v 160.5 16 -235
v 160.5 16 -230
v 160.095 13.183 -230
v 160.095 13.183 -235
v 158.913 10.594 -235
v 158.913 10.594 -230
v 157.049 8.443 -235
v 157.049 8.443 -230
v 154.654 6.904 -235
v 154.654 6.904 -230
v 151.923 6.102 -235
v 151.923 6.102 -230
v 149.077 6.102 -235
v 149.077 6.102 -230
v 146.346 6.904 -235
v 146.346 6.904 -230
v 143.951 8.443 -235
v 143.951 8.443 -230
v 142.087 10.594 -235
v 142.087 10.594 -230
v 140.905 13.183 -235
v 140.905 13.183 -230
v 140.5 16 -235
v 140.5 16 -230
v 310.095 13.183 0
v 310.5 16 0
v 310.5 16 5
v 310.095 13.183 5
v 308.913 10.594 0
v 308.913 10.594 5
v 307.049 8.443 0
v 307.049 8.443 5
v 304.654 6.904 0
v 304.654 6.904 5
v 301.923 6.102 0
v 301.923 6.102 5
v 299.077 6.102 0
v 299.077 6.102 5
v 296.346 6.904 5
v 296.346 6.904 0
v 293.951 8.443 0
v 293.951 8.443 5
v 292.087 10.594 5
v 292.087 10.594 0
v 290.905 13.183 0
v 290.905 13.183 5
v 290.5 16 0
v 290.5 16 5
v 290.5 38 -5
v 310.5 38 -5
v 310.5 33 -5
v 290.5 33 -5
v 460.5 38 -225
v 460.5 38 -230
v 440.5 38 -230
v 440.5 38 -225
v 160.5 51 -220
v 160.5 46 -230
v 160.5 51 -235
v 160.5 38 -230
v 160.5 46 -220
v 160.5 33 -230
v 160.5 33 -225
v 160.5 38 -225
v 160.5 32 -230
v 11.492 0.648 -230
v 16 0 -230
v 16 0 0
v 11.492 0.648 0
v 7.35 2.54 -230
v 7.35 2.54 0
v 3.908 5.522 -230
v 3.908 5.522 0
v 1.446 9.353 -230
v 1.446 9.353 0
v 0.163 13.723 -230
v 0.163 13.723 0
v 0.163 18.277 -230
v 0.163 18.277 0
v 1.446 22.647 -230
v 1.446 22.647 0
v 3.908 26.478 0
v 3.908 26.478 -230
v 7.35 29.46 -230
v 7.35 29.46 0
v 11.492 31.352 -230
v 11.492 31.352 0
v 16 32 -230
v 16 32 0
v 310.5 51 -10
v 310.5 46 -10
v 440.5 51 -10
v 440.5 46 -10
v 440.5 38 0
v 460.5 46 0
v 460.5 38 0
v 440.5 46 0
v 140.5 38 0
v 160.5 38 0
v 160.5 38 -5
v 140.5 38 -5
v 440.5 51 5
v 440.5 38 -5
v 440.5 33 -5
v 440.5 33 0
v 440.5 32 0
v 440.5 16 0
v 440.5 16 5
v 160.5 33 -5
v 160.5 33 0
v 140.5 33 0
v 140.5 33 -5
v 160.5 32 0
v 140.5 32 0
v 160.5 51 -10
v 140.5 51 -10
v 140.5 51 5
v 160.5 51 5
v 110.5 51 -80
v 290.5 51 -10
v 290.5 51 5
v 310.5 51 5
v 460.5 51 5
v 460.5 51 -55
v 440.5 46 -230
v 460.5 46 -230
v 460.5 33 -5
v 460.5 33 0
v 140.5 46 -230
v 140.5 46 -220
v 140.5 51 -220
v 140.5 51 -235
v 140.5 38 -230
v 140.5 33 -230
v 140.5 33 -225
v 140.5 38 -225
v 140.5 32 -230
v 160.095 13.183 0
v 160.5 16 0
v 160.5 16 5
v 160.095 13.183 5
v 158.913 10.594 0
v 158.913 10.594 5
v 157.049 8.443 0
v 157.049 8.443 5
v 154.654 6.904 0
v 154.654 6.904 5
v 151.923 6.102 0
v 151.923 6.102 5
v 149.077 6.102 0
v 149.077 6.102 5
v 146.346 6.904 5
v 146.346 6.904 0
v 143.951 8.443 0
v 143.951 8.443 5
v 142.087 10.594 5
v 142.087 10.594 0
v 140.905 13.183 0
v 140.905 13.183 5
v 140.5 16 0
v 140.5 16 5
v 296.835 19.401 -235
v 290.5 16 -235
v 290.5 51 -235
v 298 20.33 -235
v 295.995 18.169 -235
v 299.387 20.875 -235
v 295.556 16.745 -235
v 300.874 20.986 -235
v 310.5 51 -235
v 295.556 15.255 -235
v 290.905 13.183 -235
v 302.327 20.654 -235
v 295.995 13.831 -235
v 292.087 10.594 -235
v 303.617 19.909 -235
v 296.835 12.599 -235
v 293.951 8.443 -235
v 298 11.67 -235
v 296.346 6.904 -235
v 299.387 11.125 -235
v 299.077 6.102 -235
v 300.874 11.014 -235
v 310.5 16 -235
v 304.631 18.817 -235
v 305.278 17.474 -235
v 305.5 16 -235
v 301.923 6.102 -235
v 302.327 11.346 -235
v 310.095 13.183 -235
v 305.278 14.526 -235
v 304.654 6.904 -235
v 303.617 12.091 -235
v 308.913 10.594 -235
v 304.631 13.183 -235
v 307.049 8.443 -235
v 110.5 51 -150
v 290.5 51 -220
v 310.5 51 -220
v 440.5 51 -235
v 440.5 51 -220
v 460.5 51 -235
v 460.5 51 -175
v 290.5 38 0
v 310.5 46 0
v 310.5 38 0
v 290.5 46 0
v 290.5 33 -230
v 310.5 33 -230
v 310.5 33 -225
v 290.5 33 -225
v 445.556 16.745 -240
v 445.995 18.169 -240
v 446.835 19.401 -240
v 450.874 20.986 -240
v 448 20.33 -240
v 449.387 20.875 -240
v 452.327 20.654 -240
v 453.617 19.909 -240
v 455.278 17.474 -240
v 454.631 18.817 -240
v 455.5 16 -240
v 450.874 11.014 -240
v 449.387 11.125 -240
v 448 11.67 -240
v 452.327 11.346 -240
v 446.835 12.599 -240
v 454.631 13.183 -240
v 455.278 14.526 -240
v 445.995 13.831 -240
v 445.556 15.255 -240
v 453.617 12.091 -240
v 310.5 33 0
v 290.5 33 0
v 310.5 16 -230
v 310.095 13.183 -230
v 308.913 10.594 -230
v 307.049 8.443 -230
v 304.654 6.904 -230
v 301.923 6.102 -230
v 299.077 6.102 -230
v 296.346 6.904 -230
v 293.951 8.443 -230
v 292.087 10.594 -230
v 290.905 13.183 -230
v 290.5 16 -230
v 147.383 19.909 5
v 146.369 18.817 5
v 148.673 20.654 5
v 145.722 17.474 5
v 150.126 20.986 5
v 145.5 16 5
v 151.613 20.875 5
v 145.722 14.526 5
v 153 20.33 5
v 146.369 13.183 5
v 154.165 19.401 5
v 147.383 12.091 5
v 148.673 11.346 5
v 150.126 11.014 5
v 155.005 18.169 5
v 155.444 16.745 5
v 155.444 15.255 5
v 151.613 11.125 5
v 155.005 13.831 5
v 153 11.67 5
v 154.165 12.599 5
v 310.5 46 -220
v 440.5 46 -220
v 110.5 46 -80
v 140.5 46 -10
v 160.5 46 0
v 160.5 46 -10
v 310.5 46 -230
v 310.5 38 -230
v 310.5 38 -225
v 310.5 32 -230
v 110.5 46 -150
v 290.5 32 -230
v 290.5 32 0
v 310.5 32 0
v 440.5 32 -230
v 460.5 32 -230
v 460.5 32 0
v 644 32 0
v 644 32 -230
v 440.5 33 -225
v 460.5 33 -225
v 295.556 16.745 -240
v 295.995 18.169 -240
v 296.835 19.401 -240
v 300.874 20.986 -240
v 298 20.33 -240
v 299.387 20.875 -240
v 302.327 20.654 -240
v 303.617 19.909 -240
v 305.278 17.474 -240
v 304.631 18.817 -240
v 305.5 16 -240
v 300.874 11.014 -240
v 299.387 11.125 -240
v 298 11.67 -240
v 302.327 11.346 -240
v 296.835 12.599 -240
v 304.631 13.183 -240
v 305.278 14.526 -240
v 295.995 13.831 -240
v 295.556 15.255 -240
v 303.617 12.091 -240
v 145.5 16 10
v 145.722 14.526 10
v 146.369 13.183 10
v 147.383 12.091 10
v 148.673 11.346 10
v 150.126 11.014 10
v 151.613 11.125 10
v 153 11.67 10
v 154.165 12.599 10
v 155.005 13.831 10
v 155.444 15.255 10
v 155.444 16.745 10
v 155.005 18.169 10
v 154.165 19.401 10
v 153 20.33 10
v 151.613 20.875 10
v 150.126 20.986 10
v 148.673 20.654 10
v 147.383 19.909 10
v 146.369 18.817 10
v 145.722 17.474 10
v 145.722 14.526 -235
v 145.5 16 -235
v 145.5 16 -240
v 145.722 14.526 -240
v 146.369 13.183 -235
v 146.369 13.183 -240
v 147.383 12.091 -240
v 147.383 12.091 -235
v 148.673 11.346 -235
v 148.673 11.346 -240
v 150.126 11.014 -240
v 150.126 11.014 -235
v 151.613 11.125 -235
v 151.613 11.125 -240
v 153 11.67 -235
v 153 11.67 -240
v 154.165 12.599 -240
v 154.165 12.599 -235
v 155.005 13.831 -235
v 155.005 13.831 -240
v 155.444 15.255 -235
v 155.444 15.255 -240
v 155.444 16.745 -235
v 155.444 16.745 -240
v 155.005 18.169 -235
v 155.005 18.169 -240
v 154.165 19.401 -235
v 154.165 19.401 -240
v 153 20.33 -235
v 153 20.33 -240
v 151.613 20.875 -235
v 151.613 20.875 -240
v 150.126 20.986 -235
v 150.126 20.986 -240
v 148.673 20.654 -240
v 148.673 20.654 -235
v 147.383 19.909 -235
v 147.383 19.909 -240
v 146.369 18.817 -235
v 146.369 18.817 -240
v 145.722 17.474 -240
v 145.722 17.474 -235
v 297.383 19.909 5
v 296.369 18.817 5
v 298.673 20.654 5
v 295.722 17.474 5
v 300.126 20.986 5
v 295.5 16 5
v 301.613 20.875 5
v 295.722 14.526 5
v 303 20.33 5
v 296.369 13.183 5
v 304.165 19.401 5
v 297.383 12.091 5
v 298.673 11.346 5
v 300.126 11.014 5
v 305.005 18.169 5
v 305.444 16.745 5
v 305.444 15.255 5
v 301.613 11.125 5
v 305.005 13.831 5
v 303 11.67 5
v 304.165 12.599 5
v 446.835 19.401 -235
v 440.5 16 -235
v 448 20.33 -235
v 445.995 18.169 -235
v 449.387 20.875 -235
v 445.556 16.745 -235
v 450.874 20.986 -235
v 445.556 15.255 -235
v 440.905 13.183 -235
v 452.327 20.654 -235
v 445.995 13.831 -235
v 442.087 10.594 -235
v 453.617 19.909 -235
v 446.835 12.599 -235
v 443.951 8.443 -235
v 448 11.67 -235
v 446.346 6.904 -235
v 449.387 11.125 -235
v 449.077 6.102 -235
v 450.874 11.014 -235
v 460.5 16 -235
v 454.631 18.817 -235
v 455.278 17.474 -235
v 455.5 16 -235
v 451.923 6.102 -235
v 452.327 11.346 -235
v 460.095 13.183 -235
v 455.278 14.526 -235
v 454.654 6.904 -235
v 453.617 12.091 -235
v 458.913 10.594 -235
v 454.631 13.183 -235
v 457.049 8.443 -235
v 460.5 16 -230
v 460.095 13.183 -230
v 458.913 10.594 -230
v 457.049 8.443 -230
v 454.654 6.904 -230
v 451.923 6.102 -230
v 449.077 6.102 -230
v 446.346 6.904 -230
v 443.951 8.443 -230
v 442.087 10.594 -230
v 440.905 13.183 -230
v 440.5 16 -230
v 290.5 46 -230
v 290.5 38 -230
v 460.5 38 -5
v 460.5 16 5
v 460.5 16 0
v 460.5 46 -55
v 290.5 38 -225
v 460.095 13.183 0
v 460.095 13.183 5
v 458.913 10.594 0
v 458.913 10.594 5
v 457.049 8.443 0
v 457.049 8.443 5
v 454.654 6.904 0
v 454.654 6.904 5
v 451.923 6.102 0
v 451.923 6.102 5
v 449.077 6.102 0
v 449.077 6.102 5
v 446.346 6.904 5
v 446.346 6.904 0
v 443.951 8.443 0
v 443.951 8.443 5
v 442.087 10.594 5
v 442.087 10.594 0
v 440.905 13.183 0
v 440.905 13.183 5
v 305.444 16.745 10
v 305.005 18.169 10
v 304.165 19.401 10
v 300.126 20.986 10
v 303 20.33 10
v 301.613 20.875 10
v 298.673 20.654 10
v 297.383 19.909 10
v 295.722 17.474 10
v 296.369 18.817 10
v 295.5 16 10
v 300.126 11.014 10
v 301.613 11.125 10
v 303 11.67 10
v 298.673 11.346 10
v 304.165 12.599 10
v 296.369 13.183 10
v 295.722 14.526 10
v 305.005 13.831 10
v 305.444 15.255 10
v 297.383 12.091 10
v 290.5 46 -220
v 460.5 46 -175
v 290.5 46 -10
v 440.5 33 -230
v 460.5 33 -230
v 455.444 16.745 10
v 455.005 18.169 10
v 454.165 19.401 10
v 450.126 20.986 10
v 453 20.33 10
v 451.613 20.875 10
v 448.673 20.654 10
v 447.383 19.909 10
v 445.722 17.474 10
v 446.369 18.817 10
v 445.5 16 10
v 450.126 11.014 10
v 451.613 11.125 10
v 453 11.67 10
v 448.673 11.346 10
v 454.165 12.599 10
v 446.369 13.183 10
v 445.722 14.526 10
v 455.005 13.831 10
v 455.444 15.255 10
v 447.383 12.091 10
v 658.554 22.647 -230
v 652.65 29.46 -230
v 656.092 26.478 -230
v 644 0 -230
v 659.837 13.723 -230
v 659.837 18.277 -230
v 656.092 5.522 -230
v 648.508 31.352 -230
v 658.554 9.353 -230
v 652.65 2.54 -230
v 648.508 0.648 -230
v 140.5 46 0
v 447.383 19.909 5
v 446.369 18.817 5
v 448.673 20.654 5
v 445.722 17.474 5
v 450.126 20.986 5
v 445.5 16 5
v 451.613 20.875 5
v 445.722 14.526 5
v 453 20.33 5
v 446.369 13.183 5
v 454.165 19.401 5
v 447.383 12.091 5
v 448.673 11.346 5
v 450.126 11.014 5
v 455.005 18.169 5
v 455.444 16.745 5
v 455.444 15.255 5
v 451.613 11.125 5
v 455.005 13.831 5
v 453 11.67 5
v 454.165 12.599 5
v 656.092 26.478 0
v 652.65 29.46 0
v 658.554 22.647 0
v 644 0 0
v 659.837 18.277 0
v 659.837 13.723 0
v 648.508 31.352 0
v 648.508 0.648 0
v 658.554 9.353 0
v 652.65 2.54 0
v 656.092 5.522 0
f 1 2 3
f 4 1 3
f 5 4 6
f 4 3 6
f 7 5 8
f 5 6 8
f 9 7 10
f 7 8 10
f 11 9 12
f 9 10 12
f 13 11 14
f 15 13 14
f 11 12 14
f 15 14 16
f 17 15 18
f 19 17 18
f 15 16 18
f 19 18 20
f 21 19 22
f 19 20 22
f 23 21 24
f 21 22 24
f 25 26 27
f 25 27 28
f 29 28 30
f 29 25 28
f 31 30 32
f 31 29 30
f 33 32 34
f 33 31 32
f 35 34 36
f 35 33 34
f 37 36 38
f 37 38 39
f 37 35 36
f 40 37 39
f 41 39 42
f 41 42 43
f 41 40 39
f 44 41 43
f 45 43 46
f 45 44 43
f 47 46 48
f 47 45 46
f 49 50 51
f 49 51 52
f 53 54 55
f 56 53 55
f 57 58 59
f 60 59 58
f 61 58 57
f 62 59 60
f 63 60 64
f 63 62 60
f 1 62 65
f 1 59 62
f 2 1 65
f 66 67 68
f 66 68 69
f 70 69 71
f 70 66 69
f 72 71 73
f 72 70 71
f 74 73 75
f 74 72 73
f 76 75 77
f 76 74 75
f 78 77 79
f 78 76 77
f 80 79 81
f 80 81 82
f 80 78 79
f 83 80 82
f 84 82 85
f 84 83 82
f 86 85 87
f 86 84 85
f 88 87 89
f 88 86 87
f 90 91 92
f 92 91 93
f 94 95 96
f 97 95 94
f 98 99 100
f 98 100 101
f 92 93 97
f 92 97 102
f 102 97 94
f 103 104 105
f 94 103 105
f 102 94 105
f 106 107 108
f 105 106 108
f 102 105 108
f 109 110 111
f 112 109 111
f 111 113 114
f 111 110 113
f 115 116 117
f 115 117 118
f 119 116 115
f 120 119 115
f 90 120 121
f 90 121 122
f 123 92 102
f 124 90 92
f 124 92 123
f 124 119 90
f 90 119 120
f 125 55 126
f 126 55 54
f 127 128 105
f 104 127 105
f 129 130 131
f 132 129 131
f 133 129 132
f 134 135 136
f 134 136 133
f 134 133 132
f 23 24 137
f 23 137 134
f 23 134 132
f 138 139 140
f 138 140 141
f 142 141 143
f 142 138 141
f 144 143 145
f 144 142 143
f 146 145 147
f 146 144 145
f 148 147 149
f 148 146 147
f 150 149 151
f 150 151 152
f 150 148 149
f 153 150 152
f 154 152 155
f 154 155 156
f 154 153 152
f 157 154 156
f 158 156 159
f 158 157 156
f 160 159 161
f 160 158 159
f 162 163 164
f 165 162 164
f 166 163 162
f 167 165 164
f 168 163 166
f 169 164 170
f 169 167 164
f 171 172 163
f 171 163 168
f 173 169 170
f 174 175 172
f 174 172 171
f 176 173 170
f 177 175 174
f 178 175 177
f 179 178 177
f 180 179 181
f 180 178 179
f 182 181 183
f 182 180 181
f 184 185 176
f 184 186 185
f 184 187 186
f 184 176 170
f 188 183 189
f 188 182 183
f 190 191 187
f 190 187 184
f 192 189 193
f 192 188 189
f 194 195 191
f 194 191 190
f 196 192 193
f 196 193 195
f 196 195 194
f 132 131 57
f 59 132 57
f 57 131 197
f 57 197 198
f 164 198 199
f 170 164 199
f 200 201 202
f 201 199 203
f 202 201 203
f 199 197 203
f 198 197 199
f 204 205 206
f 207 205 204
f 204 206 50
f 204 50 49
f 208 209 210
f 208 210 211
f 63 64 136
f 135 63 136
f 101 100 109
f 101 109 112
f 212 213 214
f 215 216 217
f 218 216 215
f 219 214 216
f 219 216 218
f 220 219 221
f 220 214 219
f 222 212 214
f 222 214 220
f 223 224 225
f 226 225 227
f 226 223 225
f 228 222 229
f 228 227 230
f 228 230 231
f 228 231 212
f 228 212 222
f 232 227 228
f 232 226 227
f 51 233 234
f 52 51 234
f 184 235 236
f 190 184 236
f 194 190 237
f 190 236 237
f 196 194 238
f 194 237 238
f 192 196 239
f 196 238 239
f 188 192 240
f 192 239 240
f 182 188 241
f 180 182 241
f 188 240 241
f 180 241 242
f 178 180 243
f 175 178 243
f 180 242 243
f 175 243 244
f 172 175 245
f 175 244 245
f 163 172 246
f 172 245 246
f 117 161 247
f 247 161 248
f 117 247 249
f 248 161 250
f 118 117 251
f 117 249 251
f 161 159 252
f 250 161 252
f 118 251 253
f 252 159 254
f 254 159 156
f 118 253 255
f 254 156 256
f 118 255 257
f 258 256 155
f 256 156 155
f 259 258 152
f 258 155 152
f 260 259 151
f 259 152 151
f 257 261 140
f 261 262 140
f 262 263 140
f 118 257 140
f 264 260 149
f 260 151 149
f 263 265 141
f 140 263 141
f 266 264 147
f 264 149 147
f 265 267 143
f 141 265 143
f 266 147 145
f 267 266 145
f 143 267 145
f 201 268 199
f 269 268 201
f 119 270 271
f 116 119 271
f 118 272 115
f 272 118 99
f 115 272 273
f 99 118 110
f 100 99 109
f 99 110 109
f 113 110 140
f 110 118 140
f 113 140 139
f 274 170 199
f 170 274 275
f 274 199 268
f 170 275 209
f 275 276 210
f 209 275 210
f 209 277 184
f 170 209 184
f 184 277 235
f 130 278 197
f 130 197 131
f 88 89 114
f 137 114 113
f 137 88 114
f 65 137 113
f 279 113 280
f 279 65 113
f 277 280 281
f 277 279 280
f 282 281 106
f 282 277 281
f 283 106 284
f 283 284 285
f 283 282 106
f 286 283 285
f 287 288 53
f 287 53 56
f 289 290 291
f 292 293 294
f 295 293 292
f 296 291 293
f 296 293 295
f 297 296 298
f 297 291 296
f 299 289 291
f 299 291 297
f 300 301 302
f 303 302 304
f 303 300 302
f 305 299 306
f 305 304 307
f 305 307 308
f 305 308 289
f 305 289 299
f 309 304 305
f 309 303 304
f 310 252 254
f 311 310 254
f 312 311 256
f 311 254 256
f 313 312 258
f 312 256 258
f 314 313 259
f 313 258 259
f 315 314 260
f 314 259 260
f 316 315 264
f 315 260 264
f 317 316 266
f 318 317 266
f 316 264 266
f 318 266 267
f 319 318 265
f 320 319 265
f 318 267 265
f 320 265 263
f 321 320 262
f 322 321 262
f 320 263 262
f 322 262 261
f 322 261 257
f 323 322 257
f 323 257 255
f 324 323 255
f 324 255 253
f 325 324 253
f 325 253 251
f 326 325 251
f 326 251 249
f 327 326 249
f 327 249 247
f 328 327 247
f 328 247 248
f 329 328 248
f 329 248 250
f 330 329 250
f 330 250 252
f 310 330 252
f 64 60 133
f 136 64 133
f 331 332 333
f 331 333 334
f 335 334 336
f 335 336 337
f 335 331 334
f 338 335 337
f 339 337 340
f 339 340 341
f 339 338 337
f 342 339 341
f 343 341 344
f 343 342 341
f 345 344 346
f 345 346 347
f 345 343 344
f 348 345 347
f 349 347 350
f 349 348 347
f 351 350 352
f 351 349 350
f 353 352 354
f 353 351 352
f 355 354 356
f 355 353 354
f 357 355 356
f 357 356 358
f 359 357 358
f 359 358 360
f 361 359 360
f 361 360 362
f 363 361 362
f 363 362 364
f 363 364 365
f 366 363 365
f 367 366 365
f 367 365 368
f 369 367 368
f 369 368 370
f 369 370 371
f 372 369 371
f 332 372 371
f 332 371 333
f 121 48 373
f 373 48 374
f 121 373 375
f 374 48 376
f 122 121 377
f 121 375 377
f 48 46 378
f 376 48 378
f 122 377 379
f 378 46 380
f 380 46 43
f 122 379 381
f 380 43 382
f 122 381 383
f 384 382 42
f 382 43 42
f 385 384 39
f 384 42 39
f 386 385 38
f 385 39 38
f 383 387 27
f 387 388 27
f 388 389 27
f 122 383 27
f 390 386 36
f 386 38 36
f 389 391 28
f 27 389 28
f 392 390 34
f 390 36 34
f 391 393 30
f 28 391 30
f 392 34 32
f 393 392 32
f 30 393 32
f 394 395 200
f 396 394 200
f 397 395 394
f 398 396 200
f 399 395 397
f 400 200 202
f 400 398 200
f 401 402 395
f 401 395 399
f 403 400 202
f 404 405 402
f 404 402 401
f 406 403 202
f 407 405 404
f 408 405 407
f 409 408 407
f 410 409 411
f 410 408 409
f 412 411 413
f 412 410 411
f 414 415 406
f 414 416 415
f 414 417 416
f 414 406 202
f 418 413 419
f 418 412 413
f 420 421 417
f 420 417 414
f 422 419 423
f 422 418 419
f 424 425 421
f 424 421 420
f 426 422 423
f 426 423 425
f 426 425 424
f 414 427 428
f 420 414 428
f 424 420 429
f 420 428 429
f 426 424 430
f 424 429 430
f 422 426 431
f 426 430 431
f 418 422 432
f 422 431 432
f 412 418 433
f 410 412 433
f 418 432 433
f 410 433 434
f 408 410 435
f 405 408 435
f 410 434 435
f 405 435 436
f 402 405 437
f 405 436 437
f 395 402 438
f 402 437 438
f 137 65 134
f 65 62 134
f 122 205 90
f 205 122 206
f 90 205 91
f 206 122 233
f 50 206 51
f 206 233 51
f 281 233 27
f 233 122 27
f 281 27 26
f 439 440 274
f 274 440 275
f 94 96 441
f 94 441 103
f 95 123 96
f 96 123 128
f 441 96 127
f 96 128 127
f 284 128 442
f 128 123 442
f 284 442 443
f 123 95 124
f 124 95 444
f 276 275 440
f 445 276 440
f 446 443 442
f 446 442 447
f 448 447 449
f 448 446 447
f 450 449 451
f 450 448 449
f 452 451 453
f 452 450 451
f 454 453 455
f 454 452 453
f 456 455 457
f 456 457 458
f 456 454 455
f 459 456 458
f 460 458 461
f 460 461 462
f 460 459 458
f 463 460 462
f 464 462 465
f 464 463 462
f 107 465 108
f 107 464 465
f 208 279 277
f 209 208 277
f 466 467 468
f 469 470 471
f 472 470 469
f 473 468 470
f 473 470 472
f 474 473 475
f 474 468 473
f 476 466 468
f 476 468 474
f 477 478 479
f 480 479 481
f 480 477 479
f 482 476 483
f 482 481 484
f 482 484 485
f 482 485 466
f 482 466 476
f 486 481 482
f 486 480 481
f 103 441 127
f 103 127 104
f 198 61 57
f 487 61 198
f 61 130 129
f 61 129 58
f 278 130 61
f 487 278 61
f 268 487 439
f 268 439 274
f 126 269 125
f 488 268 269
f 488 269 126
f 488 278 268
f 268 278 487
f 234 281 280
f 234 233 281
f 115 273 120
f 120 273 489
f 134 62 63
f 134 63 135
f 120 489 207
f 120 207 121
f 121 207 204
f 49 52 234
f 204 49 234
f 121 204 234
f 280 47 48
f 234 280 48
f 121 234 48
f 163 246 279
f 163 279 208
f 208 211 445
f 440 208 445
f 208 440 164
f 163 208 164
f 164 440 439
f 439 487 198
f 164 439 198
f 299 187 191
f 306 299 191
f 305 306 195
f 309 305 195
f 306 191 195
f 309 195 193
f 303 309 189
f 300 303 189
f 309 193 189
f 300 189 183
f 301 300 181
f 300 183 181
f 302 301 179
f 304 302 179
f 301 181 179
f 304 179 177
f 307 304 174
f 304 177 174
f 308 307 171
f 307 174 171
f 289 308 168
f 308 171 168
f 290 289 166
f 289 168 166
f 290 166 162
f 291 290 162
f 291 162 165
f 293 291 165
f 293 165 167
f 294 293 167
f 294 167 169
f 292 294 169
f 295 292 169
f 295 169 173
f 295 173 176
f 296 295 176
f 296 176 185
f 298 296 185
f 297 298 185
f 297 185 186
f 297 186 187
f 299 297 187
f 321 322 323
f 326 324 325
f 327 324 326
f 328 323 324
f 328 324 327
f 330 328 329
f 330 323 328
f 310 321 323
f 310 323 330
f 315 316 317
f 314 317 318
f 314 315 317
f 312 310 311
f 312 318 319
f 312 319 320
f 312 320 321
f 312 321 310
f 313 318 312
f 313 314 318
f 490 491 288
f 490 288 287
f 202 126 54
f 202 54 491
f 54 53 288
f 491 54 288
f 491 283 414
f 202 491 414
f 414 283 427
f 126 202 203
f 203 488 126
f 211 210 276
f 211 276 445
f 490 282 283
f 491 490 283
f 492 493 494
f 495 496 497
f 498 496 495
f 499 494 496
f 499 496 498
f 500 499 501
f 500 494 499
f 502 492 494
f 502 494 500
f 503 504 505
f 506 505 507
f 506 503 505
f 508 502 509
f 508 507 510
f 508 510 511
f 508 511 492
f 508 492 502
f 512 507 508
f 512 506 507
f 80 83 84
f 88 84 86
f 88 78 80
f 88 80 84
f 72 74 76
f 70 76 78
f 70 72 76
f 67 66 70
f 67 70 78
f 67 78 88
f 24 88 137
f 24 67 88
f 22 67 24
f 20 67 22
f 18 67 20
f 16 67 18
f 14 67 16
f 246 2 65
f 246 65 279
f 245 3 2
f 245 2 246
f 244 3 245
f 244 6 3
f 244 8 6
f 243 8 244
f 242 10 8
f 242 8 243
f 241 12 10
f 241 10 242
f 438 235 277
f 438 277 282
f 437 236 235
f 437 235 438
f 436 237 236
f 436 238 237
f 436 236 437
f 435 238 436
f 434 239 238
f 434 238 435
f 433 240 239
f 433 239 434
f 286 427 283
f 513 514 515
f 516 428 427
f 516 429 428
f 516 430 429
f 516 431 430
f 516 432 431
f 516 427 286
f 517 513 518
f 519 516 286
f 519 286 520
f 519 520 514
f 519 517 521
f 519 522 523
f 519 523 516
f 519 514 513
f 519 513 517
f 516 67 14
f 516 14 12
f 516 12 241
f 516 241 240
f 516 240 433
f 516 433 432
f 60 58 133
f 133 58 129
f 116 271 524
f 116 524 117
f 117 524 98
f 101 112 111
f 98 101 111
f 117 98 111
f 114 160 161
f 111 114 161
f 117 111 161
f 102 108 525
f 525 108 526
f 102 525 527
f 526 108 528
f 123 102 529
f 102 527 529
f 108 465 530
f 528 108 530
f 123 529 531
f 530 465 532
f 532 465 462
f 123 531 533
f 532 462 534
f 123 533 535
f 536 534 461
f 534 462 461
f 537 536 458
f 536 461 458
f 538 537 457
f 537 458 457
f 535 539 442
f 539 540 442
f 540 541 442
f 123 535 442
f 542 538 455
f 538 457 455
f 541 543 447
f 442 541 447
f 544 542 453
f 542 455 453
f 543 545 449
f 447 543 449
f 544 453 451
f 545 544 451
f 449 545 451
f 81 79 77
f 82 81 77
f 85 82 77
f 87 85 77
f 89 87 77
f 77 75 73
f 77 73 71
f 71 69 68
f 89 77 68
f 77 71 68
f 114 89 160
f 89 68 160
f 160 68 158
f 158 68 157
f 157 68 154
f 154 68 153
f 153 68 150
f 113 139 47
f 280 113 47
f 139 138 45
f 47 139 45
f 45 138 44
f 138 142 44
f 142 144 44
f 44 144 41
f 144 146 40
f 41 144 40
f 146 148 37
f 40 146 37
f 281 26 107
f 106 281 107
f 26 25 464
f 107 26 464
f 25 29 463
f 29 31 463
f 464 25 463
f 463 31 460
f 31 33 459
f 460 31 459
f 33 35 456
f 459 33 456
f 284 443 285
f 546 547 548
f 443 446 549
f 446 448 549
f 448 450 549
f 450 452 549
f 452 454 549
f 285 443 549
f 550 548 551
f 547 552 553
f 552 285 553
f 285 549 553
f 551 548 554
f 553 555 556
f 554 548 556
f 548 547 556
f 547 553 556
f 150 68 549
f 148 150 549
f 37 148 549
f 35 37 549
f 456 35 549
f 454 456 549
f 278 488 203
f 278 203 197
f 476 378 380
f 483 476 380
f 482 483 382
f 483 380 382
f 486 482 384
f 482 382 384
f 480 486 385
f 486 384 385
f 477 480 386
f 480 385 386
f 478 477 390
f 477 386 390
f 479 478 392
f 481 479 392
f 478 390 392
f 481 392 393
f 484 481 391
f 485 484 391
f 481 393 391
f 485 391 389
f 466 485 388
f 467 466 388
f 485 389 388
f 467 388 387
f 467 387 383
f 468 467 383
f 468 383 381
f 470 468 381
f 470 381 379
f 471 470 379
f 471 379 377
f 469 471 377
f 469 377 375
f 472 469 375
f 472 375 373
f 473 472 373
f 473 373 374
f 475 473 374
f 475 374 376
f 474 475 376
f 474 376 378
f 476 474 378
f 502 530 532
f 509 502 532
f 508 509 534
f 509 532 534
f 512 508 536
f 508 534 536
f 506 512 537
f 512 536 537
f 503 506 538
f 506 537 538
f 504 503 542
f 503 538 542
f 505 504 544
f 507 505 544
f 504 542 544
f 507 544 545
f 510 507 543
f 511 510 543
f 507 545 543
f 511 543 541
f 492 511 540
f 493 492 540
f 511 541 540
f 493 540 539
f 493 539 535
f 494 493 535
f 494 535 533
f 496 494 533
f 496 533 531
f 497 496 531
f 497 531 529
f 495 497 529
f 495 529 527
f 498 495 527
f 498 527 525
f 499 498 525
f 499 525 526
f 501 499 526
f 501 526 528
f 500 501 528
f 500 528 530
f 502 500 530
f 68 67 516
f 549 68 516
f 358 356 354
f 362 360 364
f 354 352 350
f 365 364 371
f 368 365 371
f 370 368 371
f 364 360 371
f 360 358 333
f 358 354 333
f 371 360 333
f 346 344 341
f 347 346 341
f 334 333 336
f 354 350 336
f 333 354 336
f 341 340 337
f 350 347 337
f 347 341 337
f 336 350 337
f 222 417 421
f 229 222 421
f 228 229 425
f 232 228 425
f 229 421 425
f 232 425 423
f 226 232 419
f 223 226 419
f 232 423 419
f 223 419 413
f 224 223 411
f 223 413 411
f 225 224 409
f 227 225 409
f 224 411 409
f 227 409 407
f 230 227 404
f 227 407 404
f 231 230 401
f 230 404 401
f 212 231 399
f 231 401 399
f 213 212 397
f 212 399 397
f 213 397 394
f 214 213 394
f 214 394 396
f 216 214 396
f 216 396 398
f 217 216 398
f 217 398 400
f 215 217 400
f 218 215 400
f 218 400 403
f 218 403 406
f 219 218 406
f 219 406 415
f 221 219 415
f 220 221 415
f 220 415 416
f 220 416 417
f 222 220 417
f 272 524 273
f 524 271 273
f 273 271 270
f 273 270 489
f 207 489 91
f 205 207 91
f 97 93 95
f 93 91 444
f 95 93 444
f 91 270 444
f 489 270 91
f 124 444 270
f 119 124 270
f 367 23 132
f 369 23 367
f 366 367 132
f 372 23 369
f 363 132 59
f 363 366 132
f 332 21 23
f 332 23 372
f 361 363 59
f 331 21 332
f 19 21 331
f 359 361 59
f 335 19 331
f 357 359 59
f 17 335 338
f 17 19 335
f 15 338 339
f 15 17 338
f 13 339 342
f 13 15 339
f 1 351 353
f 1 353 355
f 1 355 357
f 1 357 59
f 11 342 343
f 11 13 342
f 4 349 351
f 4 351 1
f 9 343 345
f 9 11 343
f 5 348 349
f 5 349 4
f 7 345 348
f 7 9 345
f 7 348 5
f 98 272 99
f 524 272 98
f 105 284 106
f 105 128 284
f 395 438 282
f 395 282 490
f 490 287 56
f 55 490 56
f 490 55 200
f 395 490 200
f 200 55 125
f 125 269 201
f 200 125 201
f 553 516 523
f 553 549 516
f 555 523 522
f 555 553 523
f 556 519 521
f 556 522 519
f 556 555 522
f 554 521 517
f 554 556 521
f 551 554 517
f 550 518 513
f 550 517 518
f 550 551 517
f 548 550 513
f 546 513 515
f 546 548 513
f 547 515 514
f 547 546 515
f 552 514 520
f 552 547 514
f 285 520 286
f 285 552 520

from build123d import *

# Parameters (mm, degrees)
ESBO_O1_W                      = 660
ESBO_O1_H                      = 230
RESSALTO_EXTRUS_O1_DEPTH       = 32
FILETE1_RADIUS                 = 16
FILETE1_LENGTH                 = 230
FILETE2_RADIUS                 = 16
FILETE2_LENGTH                 = 230
ESBO_O2_R                      = 5
RESSALTO_EXTRUS_O2_DEPTH       = 10
PADR_O_LINEAR1_COUNT           = 3
PADR_O_LINEAR1_PITCH           = 150
PADR_O_LINEAR1_COPY_1_SKETCH_R = 5
PADR_O_LINEAR1_COPY_1_DEPTH    = 10
PADR_O_LINEAR1_COPY_2_SKETCH_R = 5
PADR_O_LINEAR1_COPY_2_DEPTH    = 10
ESBO_O6_R                      = 5
RESSALTO_EXTRUS_O7_DEPTH       = 5
ESBO_O10_W                     = 20
ESBO_O10_H                     = 5
RESSALTO_EXTRUS_O11_DEPTH      = 5
PADR_O_LINEAR2_COUNT           = 3
PADR_O_LINEAR2_PITCH           = 150
RESSALTO_EXTRUS_O10_DEPTH      = 5
ESPELHAR2_COPY_1_SKETCH_R      = 5
ESPELHAR2_COPY_1_DEPTH         = 5
ESPELHAR2_COPY_2_SKETCH_R      = 5
ESPELHAR2_COPY_2_DEPTH         = 5
ESPELHAR2_COPY_3_SKETCH_W      = 20
ESPELHAR2_COPY_3_SKETCH_H      = 5
ESPELHAR2_COPY_3_DEPTH         = 5
ESPELHAR2_COPY_4_SKETCH_W      = 20
ESPELHAR2_COPY_4_SKETCH_H      = 5
ESPELHAR2_COPY_4_DEPTH         = 5


with BuildPart() as part:
    # Esboço1 → Ressalto-extrusão1 (new body)
    with BuildSketch(Plane(origin=(0, 0, 0), x_dir=(1, 0, 0), z_dir=(0, 1, 0))):
        with Locations((330, 115)):
            Rectangle(ESBO_O1_W, ESBO_O1_H)
    extrude(amount=RESSALTO_EXTRUS_O1_DEPTH)

    # Filete1: full round fillet: the end face becomes a half cylinder, R = half its width
    filete1_face = Plane((0, 16, -115), x_dir=(0, 0, -1), z_dir=(-1, 0, 0))  # on the end face: x along it, z out of the body
    filete1_slab = filete1_face.offset(-FILETE1_RADIUS / 2) * Box(FILETE1_LENGTH, 2 * FILETE1_RADIUS, FILETE1_RADIUS, mode=Mode.PRIVATE)  # the body's end, R deep
    filete1_round = Plane((16, 16, -115), x_dir=(-1, 0, 0), z_dir=(0, 0, -1)) * Cylinder(FILETE1_RADIUS, FILETE1_LENGTH, mode=Mode.PRIVATE)  # its axis R under the face
    add(filete1_slab - filete1_round, mode=Mode.SUBTRACT)

    # Filete2: full round fillet: the end face becomes a half cylinder, R = half its width
    filete2_face = Plane((660, 16, -115), x_dir=(0, 0, 1), z_dir=(1, 0, 0))  # on the end face: x along it, z out of the body
    filete2_slab = filete2_face.offset(-FILETE2_RADIUS / 2) * Box(FILETE2_LENGTH, 2 * FILETE2_RADIUS, FILETE2_RADIUS, mode=Mode.PRIVATE)  # the body's end, R deep
    filete2_round = Plane((644, 16, -115), x_dir=(1, 0, 0), z_dir=(0, 0, 1)) * Cylinder(FILETE2_RADIUS, FILETE2_LENGTH, mode=Mode.PRIVATE)  # its axis R under the face
    add(filete2_slab - filete2_round, mode=Mode.SUBTRACT)

    # Esboço2 → Ressalto-extrusão2 (add)
    with BuildSketch(Plane.XY):
        with Locations(Location((150.5, 16, 0), (0, 0, 180))):
            Circle(ESBO_O2_R)
    ressalto_extrus_o2 = extrude(amount=RESSALTO_EXTRUS_O2_DEPTH)

    # Espelhar1: Ressalto-extrusão2 across plane
    add(ressalto_extrus_o2.mirror(Plane.XY.offset(-115)))

    # Padrão linear1: Ressalto-extrusão2 ×3
    with Locations(*[(i * PADR_O_LINEAR1_PITCH, 0, 0) for i in range(1, PADR_O_LINEAR1_COUNT)]):
        add(ressalto_extrus_o2)

    # Padrão linear1 copy 1 sketch → Padrão linear1 copy 1 (add)
    with BuildSketch(Plane(origin=(150, 0, -230), x_dir=(1, 0, 0), z_dir=(0, 0, -1))):
        with Locations((150.5, -16)):
            Circle(PADR_O_LINEAR1_COPY_1_SKETCH_R)
    extrude(amount=PADR_O_LINEAR1_COPY_1_DEPTH)

    # Padrão linear1 copy 2 sketch → Padrão linear1 copy 2 (add)
    with BuildSketch(Plane(origin=(300, 0, -230), x_dir=(1, 0, 0), z_dir=(0, 0, -1))):
        with Locations((150.5, -16)):
            Circle(PADR_O_LINEAR1_COPY_2_SKETCH_R)
    extrude(amount=PADR_O_LINEAR1_COPY_2_DEPTH)

    # Esboço6 → Ressalto-extrusão7 (add)
    with BuildSketch(Plane.XY):
        with BuildLine():
            Line((140.5, 16), (140.5, 46))
            Line((140.5, 46), (160.5, 46))
            Line((160.5, 46), (160.5, 16))
            ThreePointArc((160.5, 16), (150.5, 6), (140.5, 16))
        make_face()
        with Locations((150.5, 16)):
            Circle(ESBO_O6_R, mode=Mode.SUBTRACT)
    ressalto_extrus_o7 = extrude(amount=RESSALTO_EXTRUS_O7_DEPTH)

    # Esboço10 → Ressalto-extrusão11 (add)
    with BuildSketch(Plane(origin=(0, 0, 0), x_dir=(-1, 0, 0), z_dir=(0, 0, -1))):
        with Locations((-150.5, 35.5)):
            Rectangle(ESBO_O10_W, ESBO_O10_H)
    ressalto_extrus_o11 = extrude(amount=RESSALTO_EXTRUS_O11_DEPTH)

    # Padrão linear2: Ressalto-extrusão7, Ressalto-extrusão11 ×3
    with Locations(*[(i * PADR_O_LINEAR2_PITCH, 0, 0) for i in range(1, PADR_O_LINEAR2_COUNT)]):
        add(ressalto_extrus_o7)
        add(ressalto_extrus_o11)

    # Esboço9 → Ressalto-extrusão10 (add)
    with BuildSketch(Plane(origin=(0, 46, 0), x_dir=(1, 0, 0), z_dir=(0, 1, 0))):
        Polygon((160.5, -5), (160.5, 10), (290.5, 10), (290.5, -5), (310.5, -5), (310.5, 10), (440.5, 10), (440.5, -5), (460.5, -5), (460.5, 55), (110.5, 80), (140.5, 10), (140.5, -5), align=None)
    ressalto_extrus_o10 = extrude(amount=RESSALTO_EXTRUS_O10_DEPTH)

    # Espelhar2: Ressalto-extrusão7, Ressalto-extrusão11, Ressalto-extrusão10 across plane
    add(ressalto_extrus_o7.mirror(Plane(origin=(0, 0, -115), x_dir=(1, 0, 0), z_dir=(0, 0, -1))))
    add(ressalto_extrus_o11.mirror(Plane(origin=(0, 0, -115), x_dir=(1, 0, 0), z_dir=(0, 0, -1))))
    add(ressalto_extrus_o10.mirror(Plane(origin=(0, 0, -115), x_dir=(1, 0, 0), z_dir=(0, 0, -1))))

    # Espelhar2 copy 1 sketch → Espelhar2 copy 1 (add)
    with BuildSketch(Plane(origin=(150, 0, -230), x_dir=(1, 0, 0), z_dir=(0, 0, -1))):
        with BuildLine():
            Line((140.5, -16), (140.5, -46))
            Line((140.5, -46), (160.5, -46))
            Line((160.5, -46), (160.5, -16))
            ThreePointArc((160.5, -16), (150.5, -6), (140.5, -16))
        make_face()
        with Locations((150.5, -16)):
            Circle(ESPELHAR2_COPY_1_SKETCH_R, mode=Mode.SUBTRACT)
    extrude(amount=ESPELHAR2_COPY_1_DEPTH)

    # Espelhar2 copy 2 sketch → Espelhar2 copy 2 (add)
    with BuildSketch(Plane(origin=(300, 0, -230), x_dir=(1, 0, 0), z_dir=(0, 0, -1))):
        with BuildLine():
            Line((140.5, -16), (140.5, -46))
            Line((140.5, -46), (160.5, -46))
            Line((160.5, -46), (160.5, -16))
            ThreePointArc((160.5, -16), (150.5, -6), (140.5, -16))
        make_face()
        with Locations((150.5, -16)):
            Circle(ESPELHAR2_COPY_2_SKETCH_R, mode=Mode.SUBTRACT)
    extrude(amount=ESPELHAR2_COPY_2_DEPTH)

    # Espelhar2 copy 3 sketch → Espelhar2 copy 3 (add)
    with BuildSketch(Plane(origin=(150, 0, -230), x_dir=(-1, 0, 0), z_dir=(0, 0, 1))):
        with Locations((-150.5, -35.5)):
            Rectangle(ESPELHAR2_COPY_3_SKETCH_W, ESPELHAR2_COPY_3_SKETCH_H)
    extrude(amount=ESPELHAR2_COPY_3_DEPTH)

    # Espelhar2 copy 4 sketch → Espelhar2 copy 4 (add)
    with BuildSketch(Plane(origin=(300, 0, -230), x_dir=(-1, 0, 0), z_dir=(0, 0, 1))):
        with Locations((-150.5, -35.5)):
            Rectangle(ESPELHAR2_COPY_4_SKETCH_W, ESPELHAR2_COPY_4_SKETCH_H)
    extrude(amount=ESPELHAR2_COPY_4_DEPTH)


solid = part.part
